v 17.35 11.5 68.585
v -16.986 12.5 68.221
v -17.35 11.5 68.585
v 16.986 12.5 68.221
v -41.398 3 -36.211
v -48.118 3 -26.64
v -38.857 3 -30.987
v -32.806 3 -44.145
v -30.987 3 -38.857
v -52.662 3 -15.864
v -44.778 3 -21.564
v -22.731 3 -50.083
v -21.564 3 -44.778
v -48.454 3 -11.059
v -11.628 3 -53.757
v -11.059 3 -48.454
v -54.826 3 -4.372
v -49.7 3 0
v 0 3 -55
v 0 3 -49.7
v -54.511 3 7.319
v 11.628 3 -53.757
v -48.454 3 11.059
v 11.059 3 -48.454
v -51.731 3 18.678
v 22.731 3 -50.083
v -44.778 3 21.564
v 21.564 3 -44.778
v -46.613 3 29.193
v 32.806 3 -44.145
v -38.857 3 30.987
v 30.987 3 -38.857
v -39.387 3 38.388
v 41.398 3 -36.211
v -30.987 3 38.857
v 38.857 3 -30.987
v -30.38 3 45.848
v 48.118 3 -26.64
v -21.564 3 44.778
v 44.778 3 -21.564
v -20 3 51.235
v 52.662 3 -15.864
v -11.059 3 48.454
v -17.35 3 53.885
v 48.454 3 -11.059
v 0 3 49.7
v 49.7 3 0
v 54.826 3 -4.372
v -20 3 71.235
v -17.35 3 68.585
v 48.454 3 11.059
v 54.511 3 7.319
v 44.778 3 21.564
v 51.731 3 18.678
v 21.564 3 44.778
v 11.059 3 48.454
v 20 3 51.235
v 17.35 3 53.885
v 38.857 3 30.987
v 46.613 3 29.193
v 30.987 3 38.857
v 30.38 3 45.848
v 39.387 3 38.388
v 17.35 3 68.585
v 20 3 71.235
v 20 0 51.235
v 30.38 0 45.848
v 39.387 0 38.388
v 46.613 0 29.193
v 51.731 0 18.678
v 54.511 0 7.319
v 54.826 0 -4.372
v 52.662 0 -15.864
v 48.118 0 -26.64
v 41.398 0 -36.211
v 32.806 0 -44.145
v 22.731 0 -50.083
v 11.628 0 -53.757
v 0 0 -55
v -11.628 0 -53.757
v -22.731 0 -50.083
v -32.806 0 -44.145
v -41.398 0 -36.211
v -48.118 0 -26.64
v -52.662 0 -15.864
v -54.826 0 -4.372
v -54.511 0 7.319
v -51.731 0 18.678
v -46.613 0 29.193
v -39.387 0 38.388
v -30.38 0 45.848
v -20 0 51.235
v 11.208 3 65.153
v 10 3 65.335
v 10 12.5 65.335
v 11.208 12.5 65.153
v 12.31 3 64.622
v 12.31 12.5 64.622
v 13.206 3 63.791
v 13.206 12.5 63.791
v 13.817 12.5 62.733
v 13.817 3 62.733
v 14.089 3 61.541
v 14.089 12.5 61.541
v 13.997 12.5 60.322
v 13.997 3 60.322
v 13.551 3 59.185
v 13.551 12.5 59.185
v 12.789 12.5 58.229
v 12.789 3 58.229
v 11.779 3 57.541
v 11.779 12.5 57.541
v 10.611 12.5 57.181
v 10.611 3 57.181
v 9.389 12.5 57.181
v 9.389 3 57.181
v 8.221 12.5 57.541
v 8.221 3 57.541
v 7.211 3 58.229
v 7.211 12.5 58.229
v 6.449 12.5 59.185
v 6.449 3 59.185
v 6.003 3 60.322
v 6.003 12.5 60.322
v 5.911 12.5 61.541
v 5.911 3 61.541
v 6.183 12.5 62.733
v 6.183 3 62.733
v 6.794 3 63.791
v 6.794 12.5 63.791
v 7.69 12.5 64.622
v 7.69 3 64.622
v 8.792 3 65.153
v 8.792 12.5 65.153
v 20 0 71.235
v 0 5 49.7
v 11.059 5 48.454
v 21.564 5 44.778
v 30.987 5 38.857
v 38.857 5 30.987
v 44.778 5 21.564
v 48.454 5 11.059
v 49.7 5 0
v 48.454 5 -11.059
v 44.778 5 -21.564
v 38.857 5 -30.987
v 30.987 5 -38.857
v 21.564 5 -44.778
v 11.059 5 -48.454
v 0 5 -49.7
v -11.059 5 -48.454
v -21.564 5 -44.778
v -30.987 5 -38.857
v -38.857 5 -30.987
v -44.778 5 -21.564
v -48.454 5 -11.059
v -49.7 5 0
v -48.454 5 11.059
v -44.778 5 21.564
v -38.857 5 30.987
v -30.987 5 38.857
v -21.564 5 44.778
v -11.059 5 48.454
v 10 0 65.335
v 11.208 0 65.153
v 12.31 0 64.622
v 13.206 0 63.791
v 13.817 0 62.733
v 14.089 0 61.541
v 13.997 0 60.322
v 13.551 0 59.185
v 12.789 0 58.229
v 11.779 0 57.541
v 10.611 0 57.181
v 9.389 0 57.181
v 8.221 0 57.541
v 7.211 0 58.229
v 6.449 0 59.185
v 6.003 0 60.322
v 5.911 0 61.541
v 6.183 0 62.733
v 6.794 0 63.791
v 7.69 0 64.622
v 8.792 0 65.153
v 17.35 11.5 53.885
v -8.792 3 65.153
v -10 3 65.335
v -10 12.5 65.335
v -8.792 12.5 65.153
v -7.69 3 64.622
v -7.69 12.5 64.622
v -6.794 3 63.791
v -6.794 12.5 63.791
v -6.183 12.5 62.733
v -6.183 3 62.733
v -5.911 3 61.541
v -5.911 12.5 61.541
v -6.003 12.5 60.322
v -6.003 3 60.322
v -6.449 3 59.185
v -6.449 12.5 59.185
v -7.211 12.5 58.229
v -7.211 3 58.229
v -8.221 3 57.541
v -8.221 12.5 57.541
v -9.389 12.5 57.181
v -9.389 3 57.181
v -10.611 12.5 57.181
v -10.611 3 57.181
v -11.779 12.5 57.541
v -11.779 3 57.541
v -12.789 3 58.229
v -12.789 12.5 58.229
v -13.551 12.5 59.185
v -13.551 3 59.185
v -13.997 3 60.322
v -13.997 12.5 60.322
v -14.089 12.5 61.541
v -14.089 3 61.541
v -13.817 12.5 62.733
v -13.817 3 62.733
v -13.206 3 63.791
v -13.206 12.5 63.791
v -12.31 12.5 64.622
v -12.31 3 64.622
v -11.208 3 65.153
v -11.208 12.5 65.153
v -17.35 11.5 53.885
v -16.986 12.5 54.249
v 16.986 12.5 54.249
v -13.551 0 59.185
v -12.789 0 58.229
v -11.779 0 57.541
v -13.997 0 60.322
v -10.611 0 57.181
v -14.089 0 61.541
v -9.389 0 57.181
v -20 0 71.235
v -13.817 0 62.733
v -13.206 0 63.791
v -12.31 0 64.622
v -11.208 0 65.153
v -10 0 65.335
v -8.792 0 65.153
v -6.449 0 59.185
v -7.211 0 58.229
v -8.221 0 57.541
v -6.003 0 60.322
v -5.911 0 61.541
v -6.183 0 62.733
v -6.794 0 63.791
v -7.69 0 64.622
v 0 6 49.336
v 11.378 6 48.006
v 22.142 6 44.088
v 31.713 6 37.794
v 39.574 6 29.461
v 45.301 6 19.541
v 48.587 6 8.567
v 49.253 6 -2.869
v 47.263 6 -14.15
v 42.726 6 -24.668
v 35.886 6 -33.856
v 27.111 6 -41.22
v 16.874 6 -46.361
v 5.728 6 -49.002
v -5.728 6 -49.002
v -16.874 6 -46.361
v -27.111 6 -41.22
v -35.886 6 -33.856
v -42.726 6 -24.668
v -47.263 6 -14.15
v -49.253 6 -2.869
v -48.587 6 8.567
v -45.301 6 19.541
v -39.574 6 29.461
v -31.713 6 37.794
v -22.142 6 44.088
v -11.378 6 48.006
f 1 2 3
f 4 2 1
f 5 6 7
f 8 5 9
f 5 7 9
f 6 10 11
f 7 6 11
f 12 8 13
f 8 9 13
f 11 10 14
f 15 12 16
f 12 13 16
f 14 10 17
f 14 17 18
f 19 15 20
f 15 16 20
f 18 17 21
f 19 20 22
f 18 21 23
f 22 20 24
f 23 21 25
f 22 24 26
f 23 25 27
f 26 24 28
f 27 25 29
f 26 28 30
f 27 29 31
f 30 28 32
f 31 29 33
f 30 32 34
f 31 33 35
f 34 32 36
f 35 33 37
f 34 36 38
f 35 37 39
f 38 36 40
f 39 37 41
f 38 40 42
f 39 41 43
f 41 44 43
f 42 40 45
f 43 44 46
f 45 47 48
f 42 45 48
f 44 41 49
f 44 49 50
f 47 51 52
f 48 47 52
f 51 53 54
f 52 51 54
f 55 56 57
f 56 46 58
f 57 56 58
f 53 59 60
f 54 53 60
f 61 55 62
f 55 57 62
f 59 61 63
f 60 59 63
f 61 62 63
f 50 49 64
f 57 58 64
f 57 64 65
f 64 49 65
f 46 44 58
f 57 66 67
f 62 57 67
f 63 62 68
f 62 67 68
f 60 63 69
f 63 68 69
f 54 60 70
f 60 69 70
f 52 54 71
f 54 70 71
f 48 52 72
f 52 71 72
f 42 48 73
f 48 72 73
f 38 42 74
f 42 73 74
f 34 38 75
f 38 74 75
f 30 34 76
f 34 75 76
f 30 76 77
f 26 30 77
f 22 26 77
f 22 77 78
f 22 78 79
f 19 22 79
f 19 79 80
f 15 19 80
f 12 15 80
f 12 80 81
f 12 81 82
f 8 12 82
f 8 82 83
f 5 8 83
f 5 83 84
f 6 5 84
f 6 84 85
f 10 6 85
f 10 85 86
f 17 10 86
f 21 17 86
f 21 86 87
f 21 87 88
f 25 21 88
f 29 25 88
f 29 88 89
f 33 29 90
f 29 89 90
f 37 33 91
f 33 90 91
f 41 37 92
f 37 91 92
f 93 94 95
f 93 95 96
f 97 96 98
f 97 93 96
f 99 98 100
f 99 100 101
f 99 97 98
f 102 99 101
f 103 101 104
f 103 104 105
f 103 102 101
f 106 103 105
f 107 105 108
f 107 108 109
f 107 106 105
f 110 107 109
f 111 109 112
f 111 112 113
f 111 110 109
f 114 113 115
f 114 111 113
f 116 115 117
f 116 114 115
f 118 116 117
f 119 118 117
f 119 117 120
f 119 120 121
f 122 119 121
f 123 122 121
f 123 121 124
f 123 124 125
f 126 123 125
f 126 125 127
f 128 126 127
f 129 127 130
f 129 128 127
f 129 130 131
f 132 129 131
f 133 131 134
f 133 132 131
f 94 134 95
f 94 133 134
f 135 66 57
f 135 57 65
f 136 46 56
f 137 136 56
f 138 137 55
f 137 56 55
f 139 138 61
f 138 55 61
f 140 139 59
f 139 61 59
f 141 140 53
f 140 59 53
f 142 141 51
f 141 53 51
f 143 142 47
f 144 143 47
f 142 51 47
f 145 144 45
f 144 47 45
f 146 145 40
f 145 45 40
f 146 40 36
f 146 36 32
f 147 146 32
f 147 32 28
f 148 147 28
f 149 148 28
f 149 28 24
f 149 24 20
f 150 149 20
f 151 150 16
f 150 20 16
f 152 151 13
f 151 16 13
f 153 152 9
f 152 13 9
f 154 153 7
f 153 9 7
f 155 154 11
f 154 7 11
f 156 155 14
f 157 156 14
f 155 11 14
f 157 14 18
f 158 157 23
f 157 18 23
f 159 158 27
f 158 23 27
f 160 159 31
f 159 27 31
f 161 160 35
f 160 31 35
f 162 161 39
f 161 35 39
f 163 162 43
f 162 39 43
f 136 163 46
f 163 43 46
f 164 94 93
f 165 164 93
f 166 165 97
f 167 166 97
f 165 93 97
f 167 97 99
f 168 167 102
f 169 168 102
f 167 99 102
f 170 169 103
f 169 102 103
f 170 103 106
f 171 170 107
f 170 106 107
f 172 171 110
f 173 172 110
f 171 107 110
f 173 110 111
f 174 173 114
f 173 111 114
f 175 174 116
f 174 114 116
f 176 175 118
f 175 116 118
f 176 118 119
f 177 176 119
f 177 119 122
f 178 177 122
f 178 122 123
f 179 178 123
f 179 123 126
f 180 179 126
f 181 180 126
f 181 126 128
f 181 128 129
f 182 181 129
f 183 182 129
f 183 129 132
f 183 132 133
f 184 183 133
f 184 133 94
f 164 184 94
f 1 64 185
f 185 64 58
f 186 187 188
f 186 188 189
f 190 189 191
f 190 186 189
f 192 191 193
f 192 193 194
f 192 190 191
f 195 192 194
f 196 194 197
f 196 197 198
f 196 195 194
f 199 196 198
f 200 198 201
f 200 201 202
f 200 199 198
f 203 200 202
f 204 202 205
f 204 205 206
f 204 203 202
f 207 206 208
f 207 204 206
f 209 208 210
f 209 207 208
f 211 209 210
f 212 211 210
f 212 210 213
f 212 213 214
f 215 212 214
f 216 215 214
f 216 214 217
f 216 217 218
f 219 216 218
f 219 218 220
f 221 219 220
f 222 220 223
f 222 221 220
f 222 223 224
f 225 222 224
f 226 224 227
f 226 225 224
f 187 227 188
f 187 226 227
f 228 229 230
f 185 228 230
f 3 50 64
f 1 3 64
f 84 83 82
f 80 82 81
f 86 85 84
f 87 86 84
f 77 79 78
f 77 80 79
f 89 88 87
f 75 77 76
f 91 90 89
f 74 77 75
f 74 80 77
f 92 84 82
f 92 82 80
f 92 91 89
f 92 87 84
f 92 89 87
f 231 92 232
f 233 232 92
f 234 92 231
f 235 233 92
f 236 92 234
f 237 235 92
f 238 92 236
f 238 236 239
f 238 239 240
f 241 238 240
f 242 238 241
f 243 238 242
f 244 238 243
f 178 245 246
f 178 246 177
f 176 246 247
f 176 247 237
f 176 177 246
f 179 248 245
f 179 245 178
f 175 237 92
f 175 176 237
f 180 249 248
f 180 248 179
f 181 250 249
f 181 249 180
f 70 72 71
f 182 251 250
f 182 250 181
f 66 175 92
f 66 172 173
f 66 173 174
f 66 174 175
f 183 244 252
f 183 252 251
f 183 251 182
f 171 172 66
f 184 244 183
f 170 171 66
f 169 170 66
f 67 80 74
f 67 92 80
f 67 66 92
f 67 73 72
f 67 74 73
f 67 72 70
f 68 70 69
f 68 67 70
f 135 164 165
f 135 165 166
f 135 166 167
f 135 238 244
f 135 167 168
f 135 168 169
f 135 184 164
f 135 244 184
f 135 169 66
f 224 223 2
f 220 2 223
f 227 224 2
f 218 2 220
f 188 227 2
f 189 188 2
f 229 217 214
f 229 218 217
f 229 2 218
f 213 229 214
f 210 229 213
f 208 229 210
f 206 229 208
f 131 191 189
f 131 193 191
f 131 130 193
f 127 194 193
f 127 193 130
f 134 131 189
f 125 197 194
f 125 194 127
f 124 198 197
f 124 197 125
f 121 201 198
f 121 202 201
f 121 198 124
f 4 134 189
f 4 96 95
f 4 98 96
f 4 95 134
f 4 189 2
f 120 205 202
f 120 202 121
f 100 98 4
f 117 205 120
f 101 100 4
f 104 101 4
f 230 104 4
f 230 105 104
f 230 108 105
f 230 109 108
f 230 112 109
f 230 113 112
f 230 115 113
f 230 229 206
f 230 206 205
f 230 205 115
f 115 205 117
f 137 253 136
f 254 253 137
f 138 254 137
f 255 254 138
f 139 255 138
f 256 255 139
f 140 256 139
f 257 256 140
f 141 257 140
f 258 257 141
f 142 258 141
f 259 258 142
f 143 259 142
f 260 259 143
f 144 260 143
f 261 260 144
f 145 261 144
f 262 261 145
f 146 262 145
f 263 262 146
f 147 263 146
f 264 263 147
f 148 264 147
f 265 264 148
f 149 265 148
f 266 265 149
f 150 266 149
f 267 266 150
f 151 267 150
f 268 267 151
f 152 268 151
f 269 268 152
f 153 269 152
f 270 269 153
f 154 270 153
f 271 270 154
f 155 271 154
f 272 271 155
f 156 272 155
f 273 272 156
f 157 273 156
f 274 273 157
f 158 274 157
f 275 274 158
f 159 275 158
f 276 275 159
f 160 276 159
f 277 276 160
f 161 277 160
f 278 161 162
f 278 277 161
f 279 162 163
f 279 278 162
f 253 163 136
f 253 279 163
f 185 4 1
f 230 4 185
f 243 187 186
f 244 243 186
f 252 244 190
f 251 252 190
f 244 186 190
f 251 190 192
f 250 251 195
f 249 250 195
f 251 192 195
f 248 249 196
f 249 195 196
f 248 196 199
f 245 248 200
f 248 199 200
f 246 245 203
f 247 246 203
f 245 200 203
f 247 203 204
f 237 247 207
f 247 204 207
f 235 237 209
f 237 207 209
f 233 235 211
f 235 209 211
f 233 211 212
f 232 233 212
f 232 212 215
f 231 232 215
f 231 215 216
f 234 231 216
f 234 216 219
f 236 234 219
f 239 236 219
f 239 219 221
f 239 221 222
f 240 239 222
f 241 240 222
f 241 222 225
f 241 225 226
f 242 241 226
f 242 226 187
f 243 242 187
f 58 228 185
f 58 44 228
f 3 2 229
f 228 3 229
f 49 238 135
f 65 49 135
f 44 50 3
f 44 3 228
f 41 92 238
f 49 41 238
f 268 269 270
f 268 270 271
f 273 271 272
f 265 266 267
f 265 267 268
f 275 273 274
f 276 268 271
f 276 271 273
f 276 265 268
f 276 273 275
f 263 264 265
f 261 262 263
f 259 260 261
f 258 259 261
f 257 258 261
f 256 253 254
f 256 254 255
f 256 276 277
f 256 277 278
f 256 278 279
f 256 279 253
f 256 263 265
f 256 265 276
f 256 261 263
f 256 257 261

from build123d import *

# Parameters (mm, degrees)
SKETCH1_R             = 55
BOSS_EXTRUDE1_DEPTH   = 3
SKETCH9_W             = 40
SKETCH9_H             = 20
BOSS_EXTRUDE4_DEPTH   = 3
SKETCH11_R            = 4.1
CUT_EXTRUDE6_DEPTH    = 4
SKETCH15_R            = 49.7
BOSS_EXTRUDE6_DEPTH   = 3
CHAMFER2_SIZE         = 1
CHAMFER2_SIZE2        = 0.363970234
SKETCH16_W            = 34.7
SKETCH16_H            = 14.7
SKETCH16_R            = 4.1
BOSS_EXTRUDE7_DEPTH   = 9.5
CHAMFER3_SIZE         = 1
CHAMFER3_SIZE2        = 0.363970234
CHAMFER3_PART_2_SIZE  = 1
CHAMFER3_PART_2_SIZE2 = 0.363970234
CHAMFER3_PART_3_SIZE  = 1
CHAMFER3_PART_3_SIZE2 = 0.363970234
CHAMFER3_PART_4_SIZE  = 1
CHAMFER3_PART_4_SIZE2 = 0.363970234


with BuildPart() as part:
    # Sketch1 → Boss-Extrude1 (new body)
    with BuildSketch(Plane(origin=(0, 0, 0), x_dir=(1, 0, 0), z_dir=(0, 1, 0))):
        with Locations(Location((0, 0, 0), (0, 0, 270))):  # turned: the seam where the file's is
            Circle(SKETCH1_R)
    extrude(amount=BOSS_EXTRUDE1_DEPTH)

    # Sketch9 → Boss-Extrude4 (add)
    with BuildSketch(Plane.XZ):
        with Locations((0, 61.23475383)):
            Rectangle(SKETCH9_W, SKETCH9_H)
    extrude(amount=-BOSS_EXTRUDE4_DEPTH)

    # Sketch11 → Cut-Extrude6 (cut, through all)
    with BuildSketch(Plane(origin=(0, 3, 0), x_dir=(1, 0, 0), z_dir=(0, 1, 0))):
        with Locations(Location((-10, -61.23475383, 0), (0, 0, 270))):  # turned: the seam where the file's is
            Circle(SKETCH11_R)
        with Locations(Location((10, -61.23475383, 0), (0, 0, 270))):  # turned: the seam where the file's is
            Circle(SKETCH11_R)
    extrude(amount=-CUT_EXTRUDE6_DEPTH, mode=Mode.SUBTRACT)

    # Sketch15 → Boss-Extrude6 (add)
    with BuildSketch(Plane(origin=(0, 3, 0), x_dir=(1, 0, 0), z_dir=(0, 1, 0))):
        with Locations(Location((0, 0, 0), (0, 0, 270))):  # turned: the seam where the file's is
            Circle(SKETCH15_R)
    extrude(amount=BOSS_EXTRUDE6_DEPTH)

    # Chamfer2
    chamfer2_edges = [part.edges().sort_by_distance(p)[0] for p in [
        (0, 6, -49.7),
    ]]
    chamfer2_side = [part.faces().sort_by_distance(p)[0] for p in [
        (0, 4.5, -49.7),
    ]]
    chamfer(chamfer2_edges, length=CHAMFER2_SIZE, length2=CHAMFER2_SIZE2, reference=chamfer2_side[0])

    # Sketch16 → Boss-Extrude7 (add)
    with BuildSketch(Plane(origin=(0, 3, 0), x_dir=(1, 0, 0), z_dir=(0, 1, 0))):
        with Locations((0, -61.23475383)):
            Rectangle(SKETCH16_W, SKETCH16_H)
        with Locations(Location((-10, -61.23475383, 0), (0, 0, 270))):  # turned: the seam where the file's is
            Circle(SKETCH16_R, mode=Mode.SUBTRACT)
        with Locations(Location((10, -61.23475383, 0), (0, 0, 270))):  # turned: the seam where the file's is
            Circle(SKETCH16_R, mode=Mode.SUBTRACT)
    extrude(amount=BOSS_EXTRUDE7_DEPTH)

    # Chamfer3
    chamfer3_edges = [part.edges().sort_by_distance(p)[0] for p in [
        (-17.35, 12.5, 61.23475383),
    ]]
    chamfer3_side = [part.faces().sort_by_distance(p)[0] for p in [
        (-17.35, 7.75, 61.23475383),
    ]]
    chamfer(chamfer3_edges, length=CHAMFER3_SIZE, length2=CHAMFER3_SIZE2, reference=chamfer3_side[0])

    # Chamfer3 part 2
    chamfer3_part_2_edges = [part.edges().sort_by_distance(p)[0] for p in [
        (0, 12.5, 68.58475383),
    ]]
    chamfer3_part_2_side = [part.faces().sort_by_distance(p)[0] for p in [
        (0, 7.75, 68.58475383),
    ]]
    chamfer(chamfer3_part_2_edges, length=CHAMFER3_PART_2_SIZE, length2=CHAMFER3_PART_2_SIZE2, reference=chamfer3_part_2_side[0])

    # Chamfer3 part 3
    chamfer3_part_3_edges = [part.edges().sort_by_distance(p)[0] for p in [
        (17.35, 12.5, 61.23475383),
    ]]
    chamfer3_part_3_side = [part.faces().sort_by_distance(p)[0] for p in [
        (17.35, 7.75, 61.23475383),
    ]]
    chamfer(chamfer3_part_3_edges, length=CHAMFER3_PART_3_SIZE, length2=CHAMFER3_PART_3_SIZE2, reference=chamfer3_part_3_side[0])

    # Chamfer3 part 4
    chamfer3_part_4_edges = [part.edges().sort_by_distance(p)[0] for p in [
        (0, 12.5, 53.88475383),
    ]]
    chamfer3_part_4_side = [part.faces().sort_by_distance(p)[0] for p in [
        (0, 7.75, 53.88475383),
    ]]
    chamfer(chamfer3_part_4_edges, length=CHAMFER3_PART_4_SIZE, length2=CHAMFER3_PART_4_SIZE2, reference=chamfer3_part_4_side[0])


solid = part.part
